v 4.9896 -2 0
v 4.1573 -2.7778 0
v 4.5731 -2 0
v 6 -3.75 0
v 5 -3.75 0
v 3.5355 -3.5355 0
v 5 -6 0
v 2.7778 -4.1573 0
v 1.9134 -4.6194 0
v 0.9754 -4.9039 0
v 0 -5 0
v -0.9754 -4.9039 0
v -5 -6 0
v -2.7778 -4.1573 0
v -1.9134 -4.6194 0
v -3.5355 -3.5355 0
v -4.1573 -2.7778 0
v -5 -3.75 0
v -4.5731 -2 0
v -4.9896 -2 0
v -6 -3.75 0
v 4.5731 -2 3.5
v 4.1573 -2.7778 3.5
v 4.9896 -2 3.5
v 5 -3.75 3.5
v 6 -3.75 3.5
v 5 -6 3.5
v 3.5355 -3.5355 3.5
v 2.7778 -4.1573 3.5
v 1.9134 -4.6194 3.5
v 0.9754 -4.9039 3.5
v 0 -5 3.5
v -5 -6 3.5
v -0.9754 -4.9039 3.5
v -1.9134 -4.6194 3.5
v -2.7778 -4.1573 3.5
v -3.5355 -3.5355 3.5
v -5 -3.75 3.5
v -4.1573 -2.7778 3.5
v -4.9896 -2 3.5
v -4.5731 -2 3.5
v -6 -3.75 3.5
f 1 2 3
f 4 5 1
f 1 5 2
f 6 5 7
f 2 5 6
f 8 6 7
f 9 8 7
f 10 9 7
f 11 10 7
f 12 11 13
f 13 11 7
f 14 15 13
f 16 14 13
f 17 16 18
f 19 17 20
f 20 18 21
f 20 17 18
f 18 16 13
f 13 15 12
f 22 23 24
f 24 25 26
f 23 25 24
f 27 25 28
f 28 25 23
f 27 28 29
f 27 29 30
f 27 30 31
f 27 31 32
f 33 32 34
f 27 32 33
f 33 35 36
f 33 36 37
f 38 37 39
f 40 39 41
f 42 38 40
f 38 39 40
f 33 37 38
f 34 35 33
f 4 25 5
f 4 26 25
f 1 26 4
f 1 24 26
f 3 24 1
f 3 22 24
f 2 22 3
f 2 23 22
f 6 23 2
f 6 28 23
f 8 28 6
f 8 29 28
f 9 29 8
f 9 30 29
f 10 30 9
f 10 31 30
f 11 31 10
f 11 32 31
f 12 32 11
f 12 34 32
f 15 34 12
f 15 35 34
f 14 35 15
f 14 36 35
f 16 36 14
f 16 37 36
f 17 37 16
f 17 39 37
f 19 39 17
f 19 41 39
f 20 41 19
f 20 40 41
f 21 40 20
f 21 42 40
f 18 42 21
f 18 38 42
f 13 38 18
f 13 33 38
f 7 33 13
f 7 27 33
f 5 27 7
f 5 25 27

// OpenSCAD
$fn=32;

linear_extrude(height=3.5) cableUClip();

//cableU();

module cableUClip() {
  difference() {
      union() {
        translate([-5,-6]) square([10,4]);
        translate([-6,-3.75]) square([12,1.75]);
      }
      circle(r = 5);      
      translate([6,-3.75]) rotate([0,0,30]) square([10,10]);
      mirror([1,0]) translate([6,-3.75]) rotate([0,0,30]) square([10,10]);
  }
}





module cableU() {
  difference() {
      union() {
        circle(r = 6.5);
        translate([-6.5,-5.5]) square([13,5.5]);
      }
      circle(r = 5);
      translate([-5,-20]) square([10,20]);
      translate([-50,-4]) square([100,2]);
    }
}
